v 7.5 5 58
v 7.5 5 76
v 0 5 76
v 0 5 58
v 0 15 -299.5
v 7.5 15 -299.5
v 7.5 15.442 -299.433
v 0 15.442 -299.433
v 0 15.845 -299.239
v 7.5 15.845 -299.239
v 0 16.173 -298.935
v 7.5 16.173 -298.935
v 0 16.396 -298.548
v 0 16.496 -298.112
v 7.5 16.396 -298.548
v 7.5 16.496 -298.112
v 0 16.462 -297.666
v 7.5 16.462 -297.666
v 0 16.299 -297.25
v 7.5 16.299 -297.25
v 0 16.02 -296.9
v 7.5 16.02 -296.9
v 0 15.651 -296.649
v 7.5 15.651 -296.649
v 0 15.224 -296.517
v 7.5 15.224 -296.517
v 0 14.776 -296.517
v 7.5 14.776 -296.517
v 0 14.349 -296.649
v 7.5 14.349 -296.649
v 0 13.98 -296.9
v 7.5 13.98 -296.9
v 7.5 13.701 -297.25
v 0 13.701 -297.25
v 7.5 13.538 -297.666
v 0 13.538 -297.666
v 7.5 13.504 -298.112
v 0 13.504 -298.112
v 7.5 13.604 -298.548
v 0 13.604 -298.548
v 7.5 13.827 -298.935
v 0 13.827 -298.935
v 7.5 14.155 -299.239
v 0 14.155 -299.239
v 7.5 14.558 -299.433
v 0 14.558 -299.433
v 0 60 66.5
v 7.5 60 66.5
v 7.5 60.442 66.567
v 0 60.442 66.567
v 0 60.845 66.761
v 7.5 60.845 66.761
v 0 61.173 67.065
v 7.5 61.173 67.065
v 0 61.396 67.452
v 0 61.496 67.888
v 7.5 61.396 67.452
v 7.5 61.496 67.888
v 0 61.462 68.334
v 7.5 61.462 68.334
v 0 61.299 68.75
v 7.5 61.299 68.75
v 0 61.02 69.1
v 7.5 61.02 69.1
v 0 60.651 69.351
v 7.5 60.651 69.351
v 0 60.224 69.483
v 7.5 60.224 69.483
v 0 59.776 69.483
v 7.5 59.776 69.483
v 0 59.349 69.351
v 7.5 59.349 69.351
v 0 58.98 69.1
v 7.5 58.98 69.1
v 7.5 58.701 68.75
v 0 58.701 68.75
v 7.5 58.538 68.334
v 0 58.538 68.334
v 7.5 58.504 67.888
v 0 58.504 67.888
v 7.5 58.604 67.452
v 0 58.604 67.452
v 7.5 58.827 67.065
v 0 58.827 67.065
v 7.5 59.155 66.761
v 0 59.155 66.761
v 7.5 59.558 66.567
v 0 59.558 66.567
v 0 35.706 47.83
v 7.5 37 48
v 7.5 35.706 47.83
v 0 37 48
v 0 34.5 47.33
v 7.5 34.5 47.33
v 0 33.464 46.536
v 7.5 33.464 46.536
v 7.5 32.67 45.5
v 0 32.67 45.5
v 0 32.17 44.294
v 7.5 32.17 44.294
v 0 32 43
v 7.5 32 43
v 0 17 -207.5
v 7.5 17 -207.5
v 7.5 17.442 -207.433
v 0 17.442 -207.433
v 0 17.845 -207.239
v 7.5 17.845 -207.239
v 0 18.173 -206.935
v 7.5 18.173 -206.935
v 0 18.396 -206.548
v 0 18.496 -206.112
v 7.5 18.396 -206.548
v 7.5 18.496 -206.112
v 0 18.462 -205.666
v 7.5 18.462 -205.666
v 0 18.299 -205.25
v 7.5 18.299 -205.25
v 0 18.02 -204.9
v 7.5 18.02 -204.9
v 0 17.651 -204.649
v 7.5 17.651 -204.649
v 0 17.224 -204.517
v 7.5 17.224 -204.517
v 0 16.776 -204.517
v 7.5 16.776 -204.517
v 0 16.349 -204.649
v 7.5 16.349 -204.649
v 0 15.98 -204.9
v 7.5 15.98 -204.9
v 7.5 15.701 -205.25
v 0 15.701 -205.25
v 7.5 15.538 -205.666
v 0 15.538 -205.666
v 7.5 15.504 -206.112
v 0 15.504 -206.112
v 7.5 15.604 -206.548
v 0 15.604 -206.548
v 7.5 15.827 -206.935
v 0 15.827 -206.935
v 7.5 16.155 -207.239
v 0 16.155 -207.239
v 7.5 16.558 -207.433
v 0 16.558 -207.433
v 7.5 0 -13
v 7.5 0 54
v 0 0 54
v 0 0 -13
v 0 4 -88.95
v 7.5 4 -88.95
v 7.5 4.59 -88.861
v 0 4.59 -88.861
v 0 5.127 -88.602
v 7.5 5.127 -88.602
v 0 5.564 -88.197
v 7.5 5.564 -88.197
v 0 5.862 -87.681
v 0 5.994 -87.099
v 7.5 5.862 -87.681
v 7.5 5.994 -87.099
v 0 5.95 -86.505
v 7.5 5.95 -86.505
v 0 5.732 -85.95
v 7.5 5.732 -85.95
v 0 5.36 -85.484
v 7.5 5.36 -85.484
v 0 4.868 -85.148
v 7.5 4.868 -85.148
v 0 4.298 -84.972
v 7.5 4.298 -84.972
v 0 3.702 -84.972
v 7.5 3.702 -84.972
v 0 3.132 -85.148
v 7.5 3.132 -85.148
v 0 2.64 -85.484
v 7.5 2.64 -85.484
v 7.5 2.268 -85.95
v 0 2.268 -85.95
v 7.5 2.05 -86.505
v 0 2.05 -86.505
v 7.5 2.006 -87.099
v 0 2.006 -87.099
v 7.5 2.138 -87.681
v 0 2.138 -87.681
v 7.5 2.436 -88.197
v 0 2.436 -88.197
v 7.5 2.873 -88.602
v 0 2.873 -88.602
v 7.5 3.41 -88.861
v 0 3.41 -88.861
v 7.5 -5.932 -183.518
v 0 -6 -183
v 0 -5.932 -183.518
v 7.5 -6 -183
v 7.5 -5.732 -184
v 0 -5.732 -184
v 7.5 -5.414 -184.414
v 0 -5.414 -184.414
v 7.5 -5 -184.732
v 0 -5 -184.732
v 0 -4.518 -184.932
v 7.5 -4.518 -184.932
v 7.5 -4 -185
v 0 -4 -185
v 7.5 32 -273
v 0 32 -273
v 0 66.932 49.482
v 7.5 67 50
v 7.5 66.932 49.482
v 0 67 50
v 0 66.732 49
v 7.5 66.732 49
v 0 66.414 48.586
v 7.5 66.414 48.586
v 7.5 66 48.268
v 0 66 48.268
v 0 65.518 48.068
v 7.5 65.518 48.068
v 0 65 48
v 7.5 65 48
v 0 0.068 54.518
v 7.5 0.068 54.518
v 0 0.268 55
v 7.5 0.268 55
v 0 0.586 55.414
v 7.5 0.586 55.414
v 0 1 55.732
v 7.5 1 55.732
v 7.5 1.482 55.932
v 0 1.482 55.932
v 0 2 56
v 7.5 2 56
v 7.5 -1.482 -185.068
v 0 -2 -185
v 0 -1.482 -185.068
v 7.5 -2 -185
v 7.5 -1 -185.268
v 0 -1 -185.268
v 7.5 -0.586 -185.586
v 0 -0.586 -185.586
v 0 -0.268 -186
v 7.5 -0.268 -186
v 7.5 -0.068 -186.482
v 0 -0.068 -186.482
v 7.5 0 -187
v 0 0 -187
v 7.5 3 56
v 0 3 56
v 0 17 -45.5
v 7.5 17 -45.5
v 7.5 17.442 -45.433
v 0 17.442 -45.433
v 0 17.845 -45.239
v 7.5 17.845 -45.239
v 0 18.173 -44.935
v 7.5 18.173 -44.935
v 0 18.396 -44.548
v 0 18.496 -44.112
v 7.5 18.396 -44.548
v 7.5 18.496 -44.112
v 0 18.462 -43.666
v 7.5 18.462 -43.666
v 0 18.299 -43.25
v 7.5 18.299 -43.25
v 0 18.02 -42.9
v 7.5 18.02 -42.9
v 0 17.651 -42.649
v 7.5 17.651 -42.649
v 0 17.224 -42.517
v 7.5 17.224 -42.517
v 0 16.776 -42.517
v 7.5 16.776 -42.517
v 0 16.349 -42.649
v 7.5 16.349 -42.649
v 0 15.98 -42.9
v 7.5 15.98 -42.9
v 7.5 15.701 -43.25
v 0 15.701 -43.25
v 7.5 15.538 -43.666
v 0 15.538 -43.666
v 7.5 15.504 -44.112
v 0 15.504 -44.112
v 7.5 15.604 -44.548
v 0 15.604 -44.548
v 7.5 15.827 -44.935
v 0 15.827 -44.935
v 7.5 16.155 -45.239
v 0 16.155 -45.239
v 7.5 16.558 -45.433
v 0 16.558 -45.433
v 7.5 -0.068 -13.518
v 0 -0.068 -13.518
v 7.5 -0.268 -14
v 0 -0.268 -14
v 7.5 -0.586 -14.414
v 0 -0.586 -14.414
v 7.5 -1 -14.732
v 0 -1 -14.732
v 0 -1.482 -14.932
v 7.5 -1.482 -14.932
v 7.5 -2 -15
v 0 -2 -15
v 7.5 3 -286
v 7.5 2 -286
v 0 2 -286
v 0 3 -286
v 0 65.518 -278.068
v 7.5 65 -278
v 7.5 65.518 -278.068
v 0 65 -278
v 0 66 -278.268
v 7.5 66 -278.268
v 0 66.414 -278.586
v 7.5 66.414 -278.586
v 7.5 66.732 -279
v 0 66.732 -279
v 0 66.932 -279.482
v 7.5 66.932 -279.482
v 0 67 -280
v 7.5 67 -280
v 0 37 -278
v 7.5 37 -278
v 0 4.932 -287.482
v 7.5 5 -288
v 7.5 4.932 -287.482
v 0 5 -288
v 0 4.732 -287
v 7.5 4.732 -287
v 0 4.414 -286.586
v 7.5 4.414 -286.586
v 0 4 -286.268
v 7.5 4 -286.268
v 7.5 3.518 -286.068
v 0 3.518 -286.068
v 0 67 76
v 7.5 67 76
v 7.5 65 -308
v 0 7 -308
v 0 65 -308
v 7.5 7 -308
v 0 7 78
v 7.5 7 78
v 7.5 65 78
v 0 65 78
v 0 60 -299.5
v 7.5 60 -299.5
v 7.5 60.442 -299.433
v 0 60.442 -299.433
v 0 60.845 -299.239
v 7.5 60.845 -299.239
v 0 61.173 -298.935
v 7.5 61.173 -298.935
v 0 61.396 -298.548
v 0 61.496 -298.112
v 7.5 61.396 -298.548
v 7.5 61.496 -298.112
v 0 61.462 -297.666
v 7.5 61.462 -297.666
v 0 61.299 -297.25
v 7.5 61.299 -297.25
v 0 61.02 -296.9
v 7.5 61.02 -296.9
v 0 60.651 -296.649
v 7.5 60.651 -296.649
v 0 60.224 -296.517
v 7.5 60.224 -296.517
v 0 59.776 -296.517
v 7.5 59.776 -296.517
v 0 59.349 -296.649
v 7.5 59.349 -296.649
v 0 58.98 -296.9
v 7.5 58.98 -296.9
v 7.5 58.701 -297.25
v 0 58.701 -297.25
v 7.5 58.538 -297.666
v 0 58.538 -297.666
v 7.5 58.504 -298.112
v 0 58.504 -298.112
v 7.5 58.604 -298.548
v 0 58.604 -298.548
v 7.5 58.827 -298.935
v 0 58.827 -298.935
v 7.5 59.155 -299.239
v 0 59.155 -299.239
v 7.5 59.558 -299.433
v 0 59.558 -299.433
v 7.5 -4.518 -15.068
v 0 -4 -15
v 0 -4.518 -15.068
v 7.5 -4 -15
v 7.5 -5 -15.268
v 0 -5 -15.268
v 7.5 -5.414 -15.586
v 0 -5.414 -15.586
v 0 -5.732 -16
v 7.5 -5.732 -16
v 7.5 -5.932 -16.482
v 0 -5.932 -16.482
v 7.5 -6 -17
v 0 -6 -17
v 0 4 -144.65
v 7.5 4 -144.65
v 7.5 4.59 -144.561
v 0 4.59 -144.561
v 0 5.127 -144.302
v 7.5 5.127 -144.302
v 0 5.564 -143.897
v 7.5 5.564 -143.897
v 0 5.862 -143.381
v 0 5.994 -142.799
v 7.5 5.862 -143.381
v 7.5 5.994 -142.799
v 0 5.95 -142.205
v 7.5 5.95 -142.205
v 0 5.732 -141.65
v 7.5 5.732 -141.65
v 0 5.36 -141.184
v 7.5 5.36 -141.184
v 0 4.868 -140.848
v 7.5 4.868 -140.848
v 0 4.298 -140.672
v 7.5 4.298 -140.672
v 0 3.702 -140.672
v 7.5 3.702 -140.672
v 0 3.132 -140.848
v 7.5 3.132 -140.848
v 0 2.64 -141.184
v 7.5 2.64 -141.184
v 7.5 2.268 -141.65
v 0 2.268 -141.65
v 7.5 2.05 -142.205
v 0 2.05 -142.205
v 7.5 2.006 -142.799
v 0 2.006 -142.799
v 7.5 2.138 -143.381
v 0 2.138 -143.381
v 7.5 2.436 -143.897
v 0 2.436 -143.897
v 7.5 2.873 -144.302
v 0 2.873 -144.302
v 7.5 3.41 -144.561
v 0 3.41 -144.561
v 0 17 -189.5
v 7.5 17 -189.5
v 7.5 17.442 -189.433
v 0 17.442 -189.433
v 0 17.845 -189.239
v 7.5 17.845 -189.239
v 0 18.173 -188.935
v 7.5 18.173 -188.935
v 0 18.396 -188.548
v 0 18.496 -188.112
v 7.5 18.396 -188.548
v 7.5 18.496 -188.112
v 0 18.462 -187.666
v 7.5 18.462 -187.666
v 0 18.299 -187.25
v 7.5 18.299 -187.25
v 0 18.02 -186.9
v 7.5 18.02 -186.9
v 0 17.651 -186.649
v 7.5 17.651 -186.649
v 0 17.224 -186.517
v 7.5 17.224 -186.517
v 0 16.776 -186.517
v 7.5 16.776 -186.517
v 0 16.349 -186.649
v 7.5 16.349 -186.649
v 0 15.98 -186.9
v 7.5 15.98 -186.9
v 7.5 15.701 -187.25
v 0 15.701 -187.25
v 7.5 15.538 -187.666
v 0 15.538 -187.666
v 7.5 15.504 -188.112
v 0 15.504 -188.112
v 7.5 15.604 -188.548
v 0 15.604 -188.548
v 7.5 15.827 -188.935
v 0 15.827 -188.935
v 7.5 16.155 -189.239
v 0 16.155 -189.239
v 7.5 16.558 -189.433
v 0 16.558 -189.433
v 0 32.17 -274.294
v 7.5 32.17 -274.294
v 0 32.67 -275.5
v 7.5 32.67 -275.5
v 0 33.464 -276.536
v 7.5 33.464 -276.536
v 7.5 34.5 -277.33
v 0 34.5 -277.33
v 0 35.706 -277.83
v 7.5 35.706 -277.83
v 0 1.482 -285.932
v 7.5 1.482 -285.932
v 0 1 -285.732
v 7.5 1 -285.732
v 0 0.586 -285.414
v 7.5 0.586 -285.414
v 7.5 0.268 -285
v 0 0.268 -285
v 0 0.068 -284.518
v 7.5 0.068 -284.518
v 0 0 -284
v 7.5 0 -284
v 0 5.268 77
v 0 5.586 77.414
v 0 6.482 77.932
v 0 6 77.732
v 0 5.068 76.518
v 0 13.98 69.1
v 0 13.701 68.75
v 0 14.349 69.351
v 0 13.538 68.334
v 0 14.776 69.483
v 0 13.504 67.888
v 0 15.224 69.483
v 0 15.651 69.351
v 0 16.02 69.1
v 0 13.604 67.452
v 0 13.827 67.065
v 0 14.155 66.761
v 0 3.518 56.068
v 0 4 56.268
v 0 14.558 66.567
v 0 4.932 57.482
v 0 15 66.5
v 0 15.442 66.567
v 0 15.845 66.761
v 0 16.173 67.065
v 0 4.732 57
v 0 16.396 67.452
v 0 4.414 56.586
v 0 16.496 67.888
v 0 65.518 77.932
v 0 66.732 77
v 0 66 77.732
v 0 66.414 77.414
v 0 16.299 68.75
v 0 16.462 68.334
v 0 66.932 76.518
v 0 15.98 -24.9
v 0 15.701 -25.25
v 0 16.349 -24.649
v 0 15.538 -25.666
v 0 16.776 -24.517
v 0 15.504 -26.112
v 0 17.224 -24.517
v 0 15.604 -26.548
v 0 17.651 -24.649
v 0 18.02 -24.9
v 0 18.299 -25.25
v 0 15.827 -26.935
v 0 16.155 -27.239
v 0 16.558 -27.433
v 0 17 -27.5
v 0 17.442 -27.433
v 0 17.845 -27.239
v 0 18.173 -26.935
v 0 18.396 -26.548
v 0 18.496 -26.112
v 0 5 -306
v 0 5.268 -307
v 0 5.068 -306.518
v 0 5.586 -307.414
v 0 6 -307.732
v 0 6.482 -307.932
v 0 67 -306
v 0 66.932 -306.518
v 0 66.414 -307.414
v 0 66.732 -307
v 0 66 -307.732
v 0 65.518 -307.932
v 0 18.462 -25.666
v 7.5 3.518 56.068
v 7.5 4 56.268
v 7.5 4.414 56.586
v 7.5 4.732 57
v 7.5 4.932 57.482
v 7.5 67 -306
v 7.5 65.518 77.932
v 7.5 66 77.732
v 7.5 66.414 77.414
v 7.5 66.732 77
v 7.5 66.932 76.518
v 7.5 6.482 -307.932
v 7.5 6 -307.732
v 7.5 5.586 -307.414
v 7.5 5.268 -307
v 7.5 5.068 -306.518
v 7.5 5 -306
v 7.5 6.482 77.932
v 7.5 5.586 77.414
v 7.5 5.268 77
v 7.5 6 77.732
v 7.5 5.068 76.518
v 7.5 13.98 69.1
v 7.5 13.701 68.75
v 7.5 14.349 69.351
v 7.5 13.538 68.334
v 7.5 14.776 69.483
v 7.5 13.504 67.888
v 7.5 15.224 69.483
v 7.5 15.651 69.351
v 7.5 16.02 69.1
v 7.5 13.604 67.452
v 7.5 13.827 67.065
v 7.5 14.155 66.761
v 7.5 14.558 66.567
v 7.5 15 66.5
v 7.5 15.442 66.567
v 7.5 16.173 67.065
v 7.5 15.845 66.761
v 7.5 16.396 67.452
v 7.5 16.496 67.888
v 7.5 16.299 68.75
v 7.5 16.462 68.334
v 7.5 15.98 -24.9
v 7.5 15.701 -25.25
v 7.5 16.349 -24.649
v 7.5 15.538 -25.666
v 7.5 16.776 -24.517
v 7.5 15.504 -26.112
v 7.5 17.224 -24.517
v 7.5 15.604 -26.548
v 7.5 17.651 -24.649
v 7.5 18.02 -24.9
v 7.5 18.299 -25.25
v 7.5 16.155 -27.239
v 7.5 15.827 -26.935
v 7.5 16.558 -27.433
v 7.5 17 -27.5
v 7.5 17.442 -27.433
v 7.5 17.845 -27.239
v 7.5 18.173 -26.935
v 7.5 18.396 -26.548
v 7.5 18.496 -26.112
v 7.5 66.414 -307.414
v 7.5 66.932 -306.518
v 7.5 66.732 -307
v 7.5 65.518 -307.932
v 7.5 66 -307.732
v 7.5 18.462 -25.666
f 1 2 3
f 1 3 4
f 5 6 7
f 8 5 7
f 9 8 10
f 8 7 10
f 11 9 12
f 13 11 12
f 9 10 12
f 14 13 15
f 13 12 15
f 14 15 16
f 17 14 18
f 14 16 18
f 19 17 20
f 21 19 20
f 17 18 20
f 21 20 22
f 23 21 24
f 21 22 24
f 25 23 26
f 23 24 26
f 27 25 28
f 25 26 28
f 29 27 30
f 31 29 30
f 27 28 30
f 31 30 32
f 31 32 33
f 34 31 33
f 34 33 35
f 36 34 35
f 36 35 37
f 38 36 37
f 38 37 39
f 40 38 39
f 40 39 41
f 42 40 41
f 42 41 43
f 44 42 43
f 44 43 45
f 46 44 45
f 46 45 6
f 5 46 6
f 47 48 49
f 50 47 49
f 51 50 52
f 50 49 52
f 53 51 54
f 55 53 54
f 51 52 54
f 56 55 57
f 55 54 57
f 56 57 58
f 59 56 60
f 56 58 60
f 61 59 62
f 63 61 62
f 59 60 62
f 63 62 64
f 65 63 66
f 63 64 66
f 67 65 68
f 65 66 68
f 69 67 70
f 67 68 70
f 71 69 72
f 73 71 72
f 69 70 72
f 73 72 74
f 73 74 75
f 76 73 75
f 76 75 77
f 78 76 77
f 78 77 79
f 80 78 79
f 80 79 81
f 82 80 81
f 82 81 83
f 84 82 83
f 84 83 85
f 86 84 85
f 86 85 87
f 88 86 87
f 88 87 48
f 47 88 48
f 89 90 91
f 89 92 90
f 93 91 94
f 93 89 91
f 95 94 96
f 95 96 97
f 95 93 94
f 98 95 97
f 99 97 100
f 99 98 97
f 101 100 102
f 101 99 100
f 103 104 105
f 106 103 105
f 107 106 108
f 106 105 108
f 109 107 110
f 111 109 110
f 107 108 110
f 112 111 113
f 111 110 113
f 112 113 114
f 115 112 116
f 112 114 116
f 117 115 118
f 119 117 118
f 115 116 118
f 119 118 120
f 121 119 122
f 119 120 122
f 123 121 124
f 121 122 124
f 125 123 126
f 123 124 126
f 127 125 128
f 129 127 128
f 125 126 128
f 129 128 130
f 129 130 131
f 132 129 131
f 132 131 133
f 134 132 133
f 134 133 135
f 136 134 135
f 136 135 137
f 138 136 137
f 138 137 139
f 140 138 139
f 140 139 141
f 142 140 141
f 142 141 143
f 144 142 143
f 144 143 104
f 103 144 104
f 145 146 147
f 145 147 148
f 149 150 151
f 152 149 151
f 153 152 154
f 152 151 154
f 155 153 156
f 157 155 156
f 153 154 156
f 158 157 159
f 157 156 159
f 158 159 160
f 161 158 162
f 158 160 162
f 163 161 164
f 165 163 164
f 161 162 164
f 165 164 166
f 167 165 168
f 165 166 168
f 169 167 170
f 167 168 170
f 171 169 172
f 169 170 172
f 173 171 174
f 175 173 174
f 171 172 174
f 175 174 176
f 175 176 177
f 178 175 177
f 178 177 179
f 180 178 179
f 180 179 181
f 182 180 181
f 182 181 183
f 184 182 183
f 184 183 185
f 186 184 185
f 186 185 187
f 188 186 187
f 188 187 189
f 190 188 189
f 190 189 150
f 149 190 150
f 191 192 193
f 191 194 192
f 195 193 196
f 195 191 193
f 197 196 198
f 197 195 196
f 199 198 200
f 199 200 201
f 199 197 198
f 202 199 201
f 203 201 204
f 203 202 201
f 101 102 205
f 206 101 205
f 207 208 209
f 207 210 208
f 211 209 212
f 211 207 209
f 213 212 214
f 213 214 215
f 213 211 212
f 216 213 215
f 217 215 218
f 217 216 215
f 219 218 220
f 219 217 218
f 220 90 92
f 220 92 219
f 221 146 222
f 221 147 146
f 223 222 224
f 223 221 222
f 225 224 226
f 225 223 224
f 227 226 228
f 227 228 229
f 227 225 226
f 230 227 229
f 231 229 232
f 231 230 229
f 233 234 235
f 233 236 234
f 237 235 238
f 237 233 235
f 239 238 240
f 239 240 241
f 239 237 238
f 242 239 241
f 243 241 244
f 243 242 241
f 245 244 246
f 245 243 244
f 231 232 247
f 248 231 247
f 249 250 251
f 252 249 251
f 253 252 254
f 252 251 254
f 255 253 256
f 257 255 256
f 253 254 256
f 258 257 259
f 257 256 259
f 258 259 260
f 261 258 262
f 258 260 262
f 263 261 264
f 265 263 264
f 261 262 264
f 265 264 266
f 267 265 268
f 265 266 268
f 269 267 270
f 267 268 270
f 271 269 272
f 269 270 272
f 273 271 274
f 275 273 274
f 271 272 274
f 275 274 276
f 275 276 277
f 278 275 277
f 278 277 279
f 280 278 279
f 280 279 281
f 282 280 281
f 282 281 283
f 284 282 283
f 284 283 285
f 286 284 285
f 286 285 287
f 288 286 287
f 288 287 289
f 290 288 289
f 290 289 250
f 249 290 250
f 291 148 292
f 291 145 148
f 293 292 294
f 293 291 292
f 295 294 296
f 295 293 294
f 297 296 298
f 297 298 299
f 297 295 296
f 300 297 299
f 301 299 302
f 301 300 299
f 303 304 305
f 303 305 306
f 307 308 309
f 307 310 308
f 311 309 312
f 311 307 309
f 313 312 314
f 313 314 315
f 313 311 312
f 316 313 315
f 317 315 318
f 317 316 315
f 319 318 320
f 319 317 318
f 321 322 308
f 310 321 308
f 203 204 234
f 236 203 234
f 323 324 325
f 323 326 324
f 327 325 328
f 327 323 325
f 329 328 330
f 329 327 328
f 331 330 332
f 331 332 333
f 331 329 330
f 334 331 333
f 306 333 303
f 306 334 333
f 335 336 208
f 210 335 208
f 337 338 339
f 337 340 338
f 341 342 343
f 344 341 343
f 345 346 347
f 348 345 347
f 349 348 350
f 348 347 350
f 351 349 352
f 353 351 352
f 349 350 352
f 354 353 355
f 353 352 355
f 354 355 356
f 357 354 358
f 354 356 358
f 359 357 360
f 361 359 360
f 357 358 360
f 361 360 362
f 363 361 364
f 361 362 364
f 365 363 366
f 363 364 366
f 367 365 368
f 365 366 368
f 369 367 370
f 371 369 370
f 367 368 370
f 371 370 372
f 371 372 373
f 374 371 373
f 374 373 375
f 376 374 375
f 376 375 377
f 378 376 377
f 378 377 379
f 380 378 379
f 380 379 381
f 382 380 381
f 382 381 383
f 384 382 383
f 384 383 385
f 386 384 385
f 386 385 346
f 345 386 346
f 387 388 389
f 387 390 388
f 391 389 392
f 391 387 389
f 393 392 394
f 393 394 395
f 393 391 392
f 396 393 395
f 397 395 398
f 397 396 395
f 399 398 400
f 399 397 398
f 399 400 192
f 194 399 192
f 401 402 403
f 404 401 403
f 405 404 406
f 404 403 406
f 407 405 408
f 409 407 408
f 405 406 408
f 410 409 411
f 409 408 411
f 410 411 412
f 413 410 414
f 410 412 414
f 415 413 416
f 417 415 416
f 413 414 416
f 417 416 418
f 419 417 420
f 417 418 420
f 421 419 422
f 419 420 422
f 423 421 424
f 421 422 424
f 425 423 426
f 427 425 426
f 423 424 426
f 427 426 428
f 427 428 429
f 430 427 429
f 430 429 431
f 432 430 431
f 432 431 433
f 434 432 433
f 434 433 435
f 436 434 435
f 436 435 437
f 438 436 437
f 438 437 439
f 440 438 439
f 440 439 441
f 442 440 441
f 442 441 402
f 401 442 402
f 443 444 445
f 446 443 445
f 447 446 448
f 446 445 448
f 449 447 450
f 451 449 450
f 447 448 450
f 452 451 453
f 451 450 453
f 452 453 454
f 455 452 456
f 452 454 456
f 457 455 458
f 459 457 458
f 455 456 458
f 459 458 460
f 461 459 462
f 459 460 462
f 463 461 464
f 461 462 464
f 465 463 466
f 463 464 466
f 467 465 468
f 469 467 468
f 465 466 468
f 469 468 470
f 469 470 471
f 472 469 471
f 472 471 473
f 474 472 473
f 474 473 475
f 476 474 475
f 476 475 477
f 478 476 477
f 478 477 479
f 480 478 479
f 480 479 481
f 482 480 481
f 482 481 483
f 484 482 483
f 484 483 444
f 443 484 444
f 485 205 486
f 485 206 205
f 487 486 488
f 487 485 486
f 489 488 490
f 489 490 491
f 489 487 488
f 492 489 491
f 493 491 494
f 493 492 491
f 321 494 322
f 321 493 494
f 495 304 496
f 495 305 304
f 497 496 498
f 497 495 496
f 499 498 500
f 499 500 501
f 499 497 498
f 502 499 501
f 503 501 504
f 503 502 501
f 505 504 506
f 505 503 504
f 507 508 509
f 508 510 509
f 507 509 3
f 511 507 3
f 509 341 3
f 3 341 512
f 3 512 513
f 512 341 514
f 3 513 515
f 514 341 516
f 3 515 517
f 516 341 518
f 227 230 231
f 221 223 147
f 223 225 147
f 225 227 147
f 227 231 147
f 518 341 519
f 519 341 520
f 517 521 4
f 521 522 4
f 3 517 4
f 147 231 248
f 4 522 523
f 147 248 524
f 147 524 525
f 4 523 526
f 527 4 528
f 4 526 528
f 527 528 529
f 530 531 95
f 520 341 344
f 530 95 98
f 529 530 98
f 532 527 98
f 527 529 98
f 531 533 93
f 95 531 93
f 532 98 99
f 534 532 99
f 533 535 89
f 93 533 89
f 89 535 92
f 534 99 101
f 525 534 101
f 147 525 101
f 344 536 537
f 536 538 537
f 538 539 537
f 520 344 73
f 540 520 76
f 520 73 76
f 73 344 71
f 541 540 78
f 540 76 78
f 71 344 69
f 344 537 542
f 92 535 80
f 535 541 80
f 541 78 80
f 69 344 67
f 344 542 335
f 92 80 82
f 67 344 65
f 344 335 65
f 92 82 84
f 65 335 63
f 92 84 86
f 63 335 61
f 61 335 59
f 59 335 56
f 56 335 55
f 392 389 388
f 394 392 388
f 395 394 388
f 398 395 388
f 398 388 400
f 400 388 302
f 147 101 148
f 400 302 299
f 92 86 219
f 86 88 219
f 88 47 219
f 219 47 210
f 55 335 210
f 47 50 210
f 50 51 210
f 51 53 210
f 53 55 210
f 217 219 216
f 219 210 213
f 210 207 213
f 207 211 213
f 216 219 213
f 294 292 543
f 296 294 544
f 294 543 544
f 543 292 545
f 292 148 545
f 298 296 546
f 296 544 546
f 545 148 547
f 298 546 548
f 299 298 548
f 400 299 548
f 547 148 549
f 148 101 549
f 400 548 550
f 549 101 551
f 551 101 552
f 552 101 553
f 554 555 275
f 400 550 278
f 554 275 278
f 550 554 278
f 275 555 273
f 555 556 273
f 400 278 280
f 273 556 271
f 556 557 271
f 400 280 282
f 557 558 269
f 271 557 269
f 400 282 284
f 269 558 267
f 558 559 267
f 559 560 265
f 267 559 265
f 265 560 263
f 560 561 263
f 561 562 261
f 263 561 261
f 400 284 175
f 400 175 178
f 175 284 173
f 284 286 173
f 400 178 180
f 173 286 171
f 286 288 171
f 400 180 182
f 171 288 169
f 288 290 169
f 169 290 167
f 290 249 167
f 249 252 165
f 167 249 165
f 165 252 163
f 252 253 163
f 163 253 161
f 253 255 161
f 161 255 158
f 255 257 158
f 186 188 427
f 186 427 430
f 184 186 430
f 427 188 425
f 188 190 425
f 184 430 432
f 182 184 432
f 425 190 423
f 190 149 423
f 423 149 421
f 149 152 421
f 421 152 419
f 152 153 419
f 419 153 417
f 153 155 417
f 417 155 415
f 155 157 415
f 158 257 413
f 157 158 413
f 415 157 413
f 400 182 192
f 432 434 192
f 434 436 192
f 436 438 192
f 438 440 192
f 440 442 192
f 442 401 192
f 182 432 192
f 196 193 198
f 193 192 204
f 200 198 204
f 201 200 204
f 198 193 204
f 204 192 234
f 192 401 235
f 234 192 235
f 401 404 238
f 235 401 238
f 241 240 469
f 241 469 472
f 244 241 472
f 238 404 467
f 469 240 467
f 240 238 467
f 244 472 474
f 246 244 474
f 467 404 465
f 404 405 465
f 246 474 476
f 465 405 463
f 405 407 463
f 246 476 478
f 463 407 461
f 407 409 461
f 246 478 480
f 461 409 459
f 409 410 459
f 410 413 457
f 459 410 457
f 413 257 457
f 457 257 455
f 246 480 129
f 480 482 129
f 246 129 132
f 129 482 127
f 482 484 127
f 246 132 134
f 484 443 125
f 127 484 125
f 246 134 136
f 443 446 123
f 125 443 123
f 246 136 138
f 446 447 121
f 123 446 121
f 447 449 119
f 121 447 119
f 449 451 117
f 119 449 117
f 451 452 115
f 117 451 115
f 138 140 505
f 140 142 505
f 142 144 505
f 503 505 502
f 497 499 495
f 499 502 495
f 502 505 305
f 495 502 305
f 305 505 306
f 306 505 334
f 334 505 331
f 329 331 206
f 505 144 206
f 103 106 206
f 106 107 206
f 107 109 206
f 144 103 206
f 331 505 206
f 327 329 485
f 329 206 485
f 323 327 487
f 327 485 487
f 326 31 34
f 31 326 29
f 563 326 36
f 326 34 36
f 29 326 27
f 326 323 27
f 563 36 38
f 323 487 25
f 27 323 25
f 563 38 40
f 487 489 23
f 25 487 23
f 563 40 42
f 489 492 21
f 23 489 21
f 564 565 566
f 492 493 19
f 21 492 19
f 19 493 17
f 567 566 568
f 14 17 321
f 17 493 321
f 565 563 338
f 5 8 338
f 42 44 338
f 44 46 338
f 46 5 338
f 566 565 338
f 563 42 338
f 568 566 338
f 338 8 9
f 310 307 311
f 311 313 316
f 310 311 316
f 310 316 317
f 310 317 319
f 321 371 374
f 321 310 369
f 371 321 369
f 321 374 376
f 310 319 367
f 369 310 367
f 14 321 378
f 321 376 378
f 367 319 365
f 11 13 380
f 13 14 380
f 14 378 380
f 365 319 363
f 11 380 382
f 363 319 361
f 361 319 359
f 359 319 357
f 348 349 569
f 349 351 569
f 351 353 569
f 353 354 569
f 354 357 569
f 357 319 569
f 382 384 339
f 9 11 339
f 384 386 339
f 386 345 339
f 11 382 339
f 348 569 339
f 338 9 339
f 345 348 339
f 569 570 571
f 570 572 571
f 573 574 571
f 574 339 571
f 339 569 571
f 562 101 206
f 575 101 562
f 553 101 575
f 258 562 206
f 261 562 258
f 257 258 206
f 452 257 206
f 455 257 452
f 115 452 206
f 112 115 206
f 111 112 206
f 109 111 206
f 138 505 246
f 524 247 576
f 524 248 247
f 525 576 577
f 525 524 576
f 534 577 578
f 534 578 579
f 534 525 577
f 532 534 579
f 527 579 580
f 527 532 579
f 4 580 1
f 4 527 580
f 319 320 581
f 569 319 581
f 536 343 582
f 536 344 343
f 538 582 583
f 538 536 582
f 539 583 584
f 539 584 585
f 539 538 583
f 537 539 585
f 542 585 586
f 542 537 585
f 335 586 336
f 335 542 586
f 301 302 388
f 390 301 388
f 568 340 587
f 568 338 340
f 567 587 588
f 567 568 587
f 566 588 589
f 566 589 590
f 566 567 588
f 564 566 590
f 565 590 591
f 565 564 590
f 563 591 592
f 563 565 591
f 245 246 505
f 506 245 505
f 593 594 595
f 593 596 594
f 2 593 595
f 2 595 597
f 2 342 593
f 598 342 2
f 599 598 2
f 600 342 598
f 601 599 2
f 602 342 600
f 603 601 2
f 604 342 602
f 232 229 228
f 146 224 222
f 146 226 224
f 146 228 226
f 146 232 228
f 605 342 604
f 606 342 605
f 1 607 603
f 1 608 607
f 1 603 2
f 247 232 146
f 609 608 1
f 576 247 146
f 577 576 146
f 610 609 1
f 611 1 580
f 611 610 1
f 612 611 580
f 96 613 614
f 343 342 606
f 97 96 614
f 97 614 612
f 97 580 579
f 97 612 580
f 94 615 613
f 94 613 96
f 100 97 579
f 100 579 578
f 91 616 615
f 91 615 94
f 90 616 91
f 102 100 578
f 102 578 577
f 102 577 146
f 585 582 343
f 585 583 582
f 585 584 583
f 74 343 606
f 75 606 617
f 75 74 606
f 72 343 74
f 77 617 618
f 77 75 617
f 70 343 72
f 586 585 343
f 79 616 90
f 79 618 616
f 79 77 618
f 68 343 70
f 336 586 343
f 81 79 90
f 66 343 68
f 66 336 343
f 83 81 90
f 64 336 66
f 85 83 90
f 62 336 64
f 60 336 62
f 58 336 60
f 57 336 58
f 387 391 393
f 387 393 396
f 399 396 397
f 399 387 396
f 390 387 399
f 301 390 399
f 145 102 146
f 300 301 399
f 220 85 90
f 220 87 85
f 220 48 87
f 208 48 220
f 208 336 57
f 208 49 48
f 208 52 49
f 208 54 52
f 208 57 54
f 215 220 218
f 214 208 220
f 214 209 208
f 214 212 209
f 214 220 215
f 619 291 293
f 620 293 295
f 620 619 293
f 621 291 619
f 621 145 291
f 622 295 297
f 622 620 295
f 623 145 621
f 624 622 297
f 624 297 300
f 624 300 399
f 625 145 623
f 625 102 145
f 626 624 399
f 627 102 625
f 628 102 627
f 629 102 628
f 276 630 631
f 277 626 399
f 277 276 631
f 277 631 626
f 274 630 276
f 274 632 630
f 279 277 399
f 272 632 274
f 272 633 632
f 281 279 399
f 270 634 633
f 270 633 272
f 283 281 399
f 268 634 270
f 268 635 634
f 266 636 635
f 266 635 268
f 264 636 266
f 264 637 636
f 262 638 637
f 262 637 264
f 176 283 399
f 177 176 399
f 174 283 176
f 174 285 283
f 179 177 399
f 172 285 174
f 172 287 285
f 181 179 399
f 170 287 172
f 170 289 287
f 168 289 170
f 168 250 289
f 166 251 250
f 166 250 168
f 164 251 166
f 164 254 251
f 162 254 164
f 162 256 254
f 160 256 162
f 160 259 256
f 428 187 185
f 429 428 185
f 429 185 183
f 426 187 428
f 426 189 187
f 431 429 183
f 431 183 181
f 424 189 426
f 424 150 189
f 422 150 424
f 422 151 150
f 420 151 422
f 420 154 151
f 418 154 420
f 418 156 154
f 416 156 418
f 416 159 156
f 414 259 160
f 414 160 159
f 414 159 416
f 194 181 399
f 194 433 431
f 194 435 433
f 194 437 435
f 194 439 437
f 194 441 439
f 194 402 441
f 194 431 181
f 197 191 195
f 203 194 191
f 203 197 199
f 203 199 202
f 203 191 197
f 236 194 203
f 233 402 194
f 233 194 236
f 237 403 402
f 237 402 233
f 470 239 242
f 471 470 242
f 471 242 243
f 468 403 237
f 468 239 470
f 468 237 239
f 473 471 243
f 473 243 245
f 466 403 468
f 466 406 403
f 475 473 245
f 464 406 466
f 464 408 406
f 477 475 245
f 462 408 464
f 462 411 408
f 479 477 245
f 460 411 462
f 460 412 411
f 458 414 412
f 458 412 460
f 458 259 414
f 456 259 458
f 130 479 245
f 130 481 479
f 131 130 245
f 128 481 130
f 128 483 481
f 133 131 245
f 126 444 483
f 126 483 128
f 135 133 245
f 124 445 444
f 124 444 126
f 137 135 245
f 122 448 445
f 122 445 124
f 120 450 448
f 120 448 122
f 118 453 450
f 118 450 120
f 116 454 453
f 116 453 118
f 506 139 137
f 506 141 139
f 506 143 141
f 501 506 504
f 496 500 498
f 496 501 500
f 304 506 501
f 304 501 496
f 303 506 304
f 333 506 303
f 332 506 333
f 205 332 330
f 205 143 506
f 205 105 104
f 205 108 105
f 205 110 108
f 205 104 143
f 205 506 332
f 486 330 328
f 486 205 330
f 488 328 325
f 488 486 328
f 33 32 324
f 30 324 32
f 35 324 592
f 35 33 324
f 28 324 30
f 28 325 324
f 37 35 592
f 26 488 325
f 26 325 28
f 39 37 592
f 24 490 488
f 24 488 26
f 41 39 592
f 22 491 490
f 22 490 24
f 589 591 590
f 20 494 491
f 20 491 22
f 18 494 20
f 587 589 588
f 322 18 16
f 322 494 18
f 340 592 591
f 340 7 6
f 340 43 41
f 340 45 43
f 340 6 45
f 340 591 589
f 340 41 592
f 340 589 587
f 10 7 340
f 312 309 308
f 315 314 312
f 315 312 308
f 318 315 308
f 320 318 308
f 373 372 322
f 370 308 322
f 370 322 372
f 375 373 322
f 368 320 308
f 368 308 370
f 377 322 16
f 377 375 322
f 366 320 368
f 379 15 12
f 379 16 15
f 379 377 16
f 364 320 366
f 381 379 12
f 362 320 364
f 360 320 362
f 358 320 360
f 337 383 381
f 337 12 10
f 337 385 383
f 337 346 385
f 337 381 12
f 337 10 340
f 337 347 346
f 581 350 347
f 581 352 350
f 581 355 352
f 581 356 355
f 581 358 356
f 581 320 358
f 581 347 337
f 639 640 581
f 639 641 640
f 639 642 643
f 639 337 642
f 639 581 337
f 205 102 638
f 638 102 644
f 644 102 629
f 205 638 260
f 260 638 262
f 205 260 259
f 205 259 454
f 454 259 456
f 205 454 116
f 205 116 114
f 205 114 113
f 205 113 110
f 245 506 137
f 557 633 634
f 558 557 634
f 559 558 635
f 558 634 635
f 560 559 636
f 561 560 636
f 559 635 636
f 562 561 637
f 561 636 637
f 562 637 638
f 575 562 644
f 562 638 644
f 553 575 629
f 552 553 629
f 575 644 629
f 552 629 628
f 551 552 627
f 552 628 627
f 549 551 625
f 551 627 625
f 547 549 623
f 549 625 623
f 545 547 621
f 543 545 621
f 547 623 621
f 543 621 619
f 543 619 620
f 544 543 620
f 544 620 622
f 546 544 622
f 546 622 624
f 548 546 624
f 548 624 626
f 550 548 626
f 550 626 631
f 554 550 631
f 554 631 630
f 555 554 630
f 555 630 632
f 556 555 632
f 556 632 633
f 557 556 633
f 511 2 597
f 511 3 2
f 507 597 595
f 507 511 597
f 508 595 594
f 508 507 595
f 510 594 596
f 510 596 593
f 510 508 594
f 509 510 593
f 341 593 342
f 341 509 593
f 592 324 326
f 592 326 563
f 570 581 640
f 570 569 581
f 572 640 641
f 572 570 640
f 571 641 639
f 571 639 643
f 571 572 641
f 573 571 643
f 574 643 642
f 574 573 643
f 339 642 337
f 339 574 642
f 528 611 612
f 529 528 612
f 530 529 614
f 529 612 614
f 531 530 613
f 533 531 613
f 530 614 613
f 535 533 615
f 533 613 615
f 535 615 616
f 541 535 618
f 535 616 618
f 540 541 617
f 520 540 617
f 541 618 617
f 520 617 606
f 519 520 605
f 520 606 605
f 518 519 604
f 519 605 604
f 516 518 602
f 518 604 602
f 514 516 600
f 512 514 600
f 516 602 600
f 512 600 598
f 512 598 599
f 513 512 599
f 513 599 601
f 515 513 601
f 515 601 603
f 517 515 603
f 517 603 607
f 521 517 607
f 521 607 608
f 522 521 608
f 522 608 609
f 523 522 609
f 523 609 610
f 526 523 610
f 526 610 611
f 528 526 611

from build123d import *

# Parameters (mm, degrees)
EXTRUDE_1_DEPTH     = 7.5
SKETCH_2_R          = 2
CUT_EXTRUDE_1_DEPTH = 8.5
SKETCH_9_W          = 78
SKETCH_9_H          = 32
SKETCH_9_W_2        = 103
EXTRUDE_3_DEPTH     = 7.5
SKETCH_11_W         = 30
SKETCH_11_H         = 35
EXTRUDE_4_DEPTH     = 7.5
SKETCH_10_R         = 1.5
CUT_EXTRUDE_6_DEPTH = 8.5
FILLET_1_R          = 2
FILLET_3_R          = 5
SKETCH_12_W         = 22
SKETCH_12_H         = 5
CUT_EXTRUDE_7_DEPTH = 8.5
FILLET_4_R          = 2
SKETCH_13_R         = 1.5
CUT_EXTRUDE_8_DEPTH = 8.5


with BuildPart() as part:
    # 草图1 → 凸台-拉伸1 (new body)
    with BuildSketch(Plane(origin=(0, 0, 0), x_dir=(0, 0, -1), z_dir=(1, 0, 0))):
        Polygon((0, 32), (0, 0), (15, 0), (15, -6), (185, -6), (185, 0), (205, 0), (205, 32), align=None)
    extrude(amount=EXTRUDE_1_DEPTH)

    # 草图2 → 切除-拉伸1 (cut, through all)
    with BuildSketch(Plane(origin=(7.5, 0, 0), x_dir=(0, 0, -1), z_dir=(1, 0, 0))):
        with Locations((86.95, 4)):
            Circle(SKETCH_2_R)
        with Locations((142.65, 4)):
            Circle(SKETCH_2_R)
    extrude(amount=-CUT_EXTRUDE_1_DEPTH, mode=Mode.SUBTRACT)

    # 草图9 → 凸台-拉伸3 (add)
    with BuildSketch(Plane(origin=(7.5, 0, 0), x_dir=(0, 0, -1), z_dir=(1, 0, 0))):
        with Locations((-39, 16)):
            Rectangle(SKETCH_9_W, SKETCH_9_H)
        with Locations((256.5, 16)):
            Rectangle(SKETCH_9_W_2, SKETCH_9_H)
    extrude(amount=-EXTRUDE_3_DEPTH)

    # 草图11 → 凸台-拉伸4 (add)
    with BuildSketch(Plane(origin=(7.5, 0, 0), x_dir=(0, 0, -1), z_dir=(1, 0, 0))):
        with Locations((-63, 49.5)):
            Rectangle(SKETCH_11_W, SKETCH_11_H)
        with Locations((293, 49.5)):
            Rectangle(SKETCH_11_W, SKETCH_11_H)
    extrude(amount=-EXTRUDE_4_DEPTH)

    # 草图10 → 切除-拉伸6 (cut, through all)
    with BuildSketch(Plane(origin=(7.5, 0, 0), x_dir=(0, 0, -1), z_dir=(1, 0, 0))):
        with Locations((-68, 15)):
            Circle(SKETCH_10_R)
        with Locations((298, 15)):
            Circle(SKETCH_10_R)
        with Locations((-68, 60)):
            Circle(SKETCH_10_R)
        with Locations((298, 60)):
            Circle(SKETCH_10_R)
    extrude(amount=-CUT_EXTRUDE_6_DEPTH, mode=Mode.SUBTRACT)

    # 圆角1
    fillet_1_edges = [part.edges().sort_by_distance(p)[0] for p in [
        (3.75, 0, -185),
        (3.75, -6, -185),
        (3.75, -6, -15),
        (3.75, 0, -15),
        (3.75, 0, 78),
        (3.75, 0, -308),
        (3.75, 67, 78),
        (3.75, 67, 48),
        (3.75, 67, -308),
        (3.75, 67, -278),
    ]]
    fillet(fillet_1_edges, radius=FILLET_1_R)

    # 圆角3
    fillet_3_edges = [part.edges().sort_by_distance(p)[0] for p in [
        (3.75, 32, 48),
        (3.75, 32, -278),
    ]]
    fillet(fillet_3_edges, radius=FILLET_3_R)

    # 草图12 → 切除-拉伸7 (cut, through all)
    with BuildSketch(Plane(origin=(7.5, 0, 0), x_dir=(0, 0, -1), z_dir=(1, 0, 0))):
        with Locations((-67, 2.5)):
            Rectangle(SKETCH_12_W, SKETCH_12_H)
        with Locations((297, 2.5)):
            Rectangle(SKETCH_12_W, SKETCH_12_H)
    extrude(amount=-CUT_EXTRUDE_7_DEPTH, mode=Mode.SUBTRACT)

    # 圆角4
    fillet_4_edges = [part.edges().sort_by_distance(p)[0] for p in [
        (3.75, 5, 78),
        (3.75, 5, 56),
        (3.75, 0, 56),
        (3.75, 5, -308),
        (3.75, 0, -286),
        (3.75, 5, -286),
    ]]
    fillet(fillet_4_edges, radius=FILLET_4_R)

    # 草图13 → 切除-拉伸8 (cut, through all)
    with BuildSketch(Plane(origin=(7.5, 0, 0), x_dir=(0, 0, -1), z_dir=(1, 0, 0))):
        with Locations((205.999999668, 17.000000039)):
            Circle(SKETCH_13_R)
        with Locations((187.999999668, 17.000000039)):
            Circle(SKETCH_13_R)
        with Locations((43.999999668, 17.000000039)):
            Circle(SKETCH_13_R)
        with Locations((25.999999668, 17.000000039)):
            Circle(SKETCH_13_R)
    extrude(amount=-CUT_EXTRUDE_8_DEPTH, mode=Mode.SUBTRACT)


solid = part.part
